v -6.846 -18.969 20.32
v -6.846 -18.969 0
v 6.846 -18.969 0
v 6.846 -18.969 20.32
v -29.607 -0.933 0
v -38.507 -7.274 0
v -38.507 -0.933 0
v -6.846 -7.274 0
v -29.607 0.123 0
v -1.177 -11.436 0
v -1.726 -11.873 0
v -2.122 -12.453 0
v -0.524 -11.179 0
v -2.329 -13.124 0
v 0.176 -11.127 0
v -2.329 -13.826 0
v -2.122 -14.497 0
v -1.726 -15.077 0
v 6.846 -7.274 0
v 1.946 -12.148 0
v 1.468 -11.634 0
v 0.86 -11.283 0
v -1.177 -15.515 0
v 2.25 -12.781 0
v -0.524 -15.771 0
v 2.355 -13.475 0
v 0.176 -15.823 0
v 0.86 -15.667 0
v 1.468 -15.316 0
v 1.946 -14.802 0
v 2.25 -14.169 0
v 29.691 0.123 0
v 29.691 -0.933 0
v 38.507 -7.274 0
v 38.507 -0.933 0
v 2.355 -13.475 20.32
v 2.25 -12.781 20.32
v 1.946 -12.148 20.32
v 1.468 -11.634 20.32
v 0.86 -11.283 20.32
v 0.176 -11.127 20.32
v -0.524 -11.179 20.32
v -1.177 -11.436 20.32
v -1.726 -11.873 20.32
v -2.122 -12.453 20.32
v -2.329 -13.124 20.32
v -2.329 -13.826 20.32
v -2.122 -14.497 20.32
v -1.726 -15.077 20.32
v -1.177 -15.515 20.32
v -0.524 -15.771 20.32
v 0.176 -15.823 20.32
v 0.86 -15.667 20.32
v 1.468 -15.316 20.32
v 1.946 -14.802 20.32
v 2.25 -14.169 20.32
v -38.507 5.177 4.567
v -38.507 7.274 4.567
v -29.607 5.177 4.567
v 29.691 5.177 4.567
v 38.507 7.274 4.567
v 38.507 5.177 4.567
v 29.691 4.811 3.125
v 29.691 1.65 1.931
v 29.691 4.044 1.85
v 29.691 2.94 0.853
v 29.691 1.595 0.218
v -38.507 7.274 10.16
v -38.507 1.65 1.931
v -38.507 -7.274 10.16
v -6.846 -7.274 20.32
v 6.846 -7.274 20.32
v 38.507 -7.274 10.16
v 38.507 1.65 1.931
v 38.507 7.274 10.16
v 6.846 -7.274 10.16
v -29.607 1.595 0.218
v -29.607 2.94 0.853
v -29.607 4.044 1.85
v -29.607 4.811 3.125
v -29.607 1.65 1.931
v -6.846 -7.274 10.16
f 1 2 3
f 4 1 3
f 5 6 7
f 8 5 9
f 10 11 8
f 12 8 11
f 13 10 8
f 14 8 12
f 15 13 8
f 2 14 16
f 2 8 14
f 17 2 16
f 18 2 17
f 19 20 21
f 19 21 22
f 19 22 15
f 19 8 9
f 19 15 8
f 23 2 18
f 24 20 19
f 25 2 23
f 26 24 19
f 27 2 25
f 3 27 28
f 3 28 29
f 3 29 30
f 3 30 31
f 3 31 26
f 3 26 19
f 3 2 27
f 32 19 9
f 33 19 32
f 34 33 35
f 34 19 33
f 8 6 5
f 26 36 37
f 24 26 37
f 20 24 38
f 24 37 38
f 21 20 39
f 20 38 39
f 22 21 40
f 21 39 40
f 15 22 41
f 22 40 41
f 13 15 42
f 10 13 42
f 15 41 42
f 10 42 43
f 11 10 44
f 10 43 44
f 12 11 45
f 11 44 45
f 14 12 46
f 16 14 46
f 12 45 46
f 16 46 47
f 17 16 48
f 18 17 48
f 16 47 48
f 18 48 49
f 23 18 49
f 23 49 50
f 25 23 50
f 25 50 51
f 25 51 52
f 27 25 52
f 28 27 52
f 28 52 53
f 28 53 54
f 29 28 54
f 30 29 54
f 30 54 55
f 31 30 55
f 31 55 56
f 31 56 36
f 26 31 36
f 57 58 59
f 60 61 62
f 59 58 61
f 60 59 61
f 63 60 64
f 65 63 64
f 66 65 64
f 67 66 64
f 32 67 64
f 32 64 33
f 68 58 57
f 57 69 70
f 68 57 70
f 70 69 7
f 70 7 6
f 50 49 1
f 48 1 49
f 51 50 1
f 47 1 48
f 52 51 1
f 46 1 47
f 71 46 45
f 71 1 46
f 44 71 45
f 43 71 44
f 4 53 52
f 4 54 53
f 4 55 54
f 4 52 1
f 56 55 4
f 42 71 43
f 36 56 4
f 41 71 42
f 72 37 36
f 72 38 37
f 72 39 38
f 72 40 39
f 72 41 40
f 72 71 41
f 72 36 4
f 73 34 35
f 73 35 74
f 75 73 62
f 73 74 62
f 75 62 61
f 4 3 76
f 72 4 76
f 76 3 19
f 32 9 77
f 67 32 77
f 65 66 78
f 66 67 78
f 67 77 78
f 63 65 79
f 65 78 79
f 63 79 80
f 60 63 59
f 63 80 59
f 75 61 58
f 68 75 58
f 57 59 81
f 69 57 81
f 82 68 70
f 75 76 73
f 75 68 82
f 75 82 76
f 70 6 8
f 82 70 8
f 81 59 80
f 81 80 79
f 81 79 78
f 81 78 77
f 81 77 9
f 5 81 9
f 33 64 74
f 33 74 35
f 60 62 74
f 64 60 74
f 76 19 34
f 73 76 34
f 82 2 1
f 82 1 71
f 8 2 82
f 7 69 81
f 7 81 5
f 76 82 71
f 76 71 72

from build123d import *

# Parameters (mm, degrees)
F1_DEPTH    = 10.16
F0_W        = 13.6915519834
F0_H        = 11.6948671639
F2_DEPTH    = 20.32
F4_DEPTH    = 77.0159752498
F5_W        = 59.2985060066
F5_H        = 8.0565831158
F6_DEPTH    = 4.5666936785
F7_T1_DEPTH = 84.5685063134
F8_R        = 2.3549546022
F9_DEPTH    = 20.321


# Not quite as in the source:
# - a fillet or chamfer that OpenCascade refuses, or shapes differently, is made with other operations: its cross-section is extruded or revolved along the edge and cut away or added


with BuildPart() as f1:
    # F0 (on Top) → F1 (new body)
    with BuildSketch(Plane.XY):
        Polygon((38.5074876249, -7.2736367583), (38.5074876249, 7.2736367583), (-38.5074876249, 7.2736367583), (-38.5074876249, -7.2736367583), (-6.8457759917, -7.2736367583), (6.8457759917, -7.2736367583), align=None)
    extrude(amount=F1_DEPTH)

    # F0 (on Top) → F2 (join)
    with BuildSketch(Plane.XY):
        with Locations((0, -13.1210703403)):
            Rectangle(F0_W, F0_H)
    extrude(amount=F2_DEPTH)

    # F3 (on face) → F4 (cut, through all)
    with BuildSketch(Plane.YZ.offset(38.5074876249)):
        Polygon((5.1769153215, 4.5666936785), (1.6501703067, 1.9309354248), (-0.9334948961, 0), (7.2736367583, 0), (7.2736367583, 4.5666936785), align=None)
    extrude(amount=-F4_DEPTH, mode=Mode.SUBTRACT)

    # F5 (on face) → F6 (join, through all)
    with BuildSketch(Plane(origin=(0, 0, 4.5666936785), x_dir=(1, 0, 0), z_dir=(0, 0, -1))):
        with Locations((0.0417931005, -1.1486237636)):
            Rectangle(F5_W, F5_H)
    extrude(amount=F6_DEPTH)

    # F7: fillet of radius 5.08 on 1 edges, made by hand

    # F7_s2 → F7_t1 (cut)
    with BuildSketch(Plane.YZ.offset(-42.2424600562)):
        with BuildLine():
            ThreePointArc((0.1229152601, 0), (3.5287047345, 1.3107828324), (5.1769153215, 4.5666936785))
            Line((5.1769153215, 4.5666936785), (5.1769153215, 0))
            Line((5.1769153215, 0), (0.1229152601, 0))
        make_face()
    extrude(amount=F7_T1_DEPTH, mode=Mode.SUBTRACT)

    # F8 (on face) → F9 (cut, through all)
    with BuildSketch(Plane.XY.offset(20.32)):
        with Locations((0, -13.4750818834)):
            Circle(F8_R)
    extrude(amount=-F9_DEPTH, mode=Mode.SUBTRACT)


solid = f1.part
